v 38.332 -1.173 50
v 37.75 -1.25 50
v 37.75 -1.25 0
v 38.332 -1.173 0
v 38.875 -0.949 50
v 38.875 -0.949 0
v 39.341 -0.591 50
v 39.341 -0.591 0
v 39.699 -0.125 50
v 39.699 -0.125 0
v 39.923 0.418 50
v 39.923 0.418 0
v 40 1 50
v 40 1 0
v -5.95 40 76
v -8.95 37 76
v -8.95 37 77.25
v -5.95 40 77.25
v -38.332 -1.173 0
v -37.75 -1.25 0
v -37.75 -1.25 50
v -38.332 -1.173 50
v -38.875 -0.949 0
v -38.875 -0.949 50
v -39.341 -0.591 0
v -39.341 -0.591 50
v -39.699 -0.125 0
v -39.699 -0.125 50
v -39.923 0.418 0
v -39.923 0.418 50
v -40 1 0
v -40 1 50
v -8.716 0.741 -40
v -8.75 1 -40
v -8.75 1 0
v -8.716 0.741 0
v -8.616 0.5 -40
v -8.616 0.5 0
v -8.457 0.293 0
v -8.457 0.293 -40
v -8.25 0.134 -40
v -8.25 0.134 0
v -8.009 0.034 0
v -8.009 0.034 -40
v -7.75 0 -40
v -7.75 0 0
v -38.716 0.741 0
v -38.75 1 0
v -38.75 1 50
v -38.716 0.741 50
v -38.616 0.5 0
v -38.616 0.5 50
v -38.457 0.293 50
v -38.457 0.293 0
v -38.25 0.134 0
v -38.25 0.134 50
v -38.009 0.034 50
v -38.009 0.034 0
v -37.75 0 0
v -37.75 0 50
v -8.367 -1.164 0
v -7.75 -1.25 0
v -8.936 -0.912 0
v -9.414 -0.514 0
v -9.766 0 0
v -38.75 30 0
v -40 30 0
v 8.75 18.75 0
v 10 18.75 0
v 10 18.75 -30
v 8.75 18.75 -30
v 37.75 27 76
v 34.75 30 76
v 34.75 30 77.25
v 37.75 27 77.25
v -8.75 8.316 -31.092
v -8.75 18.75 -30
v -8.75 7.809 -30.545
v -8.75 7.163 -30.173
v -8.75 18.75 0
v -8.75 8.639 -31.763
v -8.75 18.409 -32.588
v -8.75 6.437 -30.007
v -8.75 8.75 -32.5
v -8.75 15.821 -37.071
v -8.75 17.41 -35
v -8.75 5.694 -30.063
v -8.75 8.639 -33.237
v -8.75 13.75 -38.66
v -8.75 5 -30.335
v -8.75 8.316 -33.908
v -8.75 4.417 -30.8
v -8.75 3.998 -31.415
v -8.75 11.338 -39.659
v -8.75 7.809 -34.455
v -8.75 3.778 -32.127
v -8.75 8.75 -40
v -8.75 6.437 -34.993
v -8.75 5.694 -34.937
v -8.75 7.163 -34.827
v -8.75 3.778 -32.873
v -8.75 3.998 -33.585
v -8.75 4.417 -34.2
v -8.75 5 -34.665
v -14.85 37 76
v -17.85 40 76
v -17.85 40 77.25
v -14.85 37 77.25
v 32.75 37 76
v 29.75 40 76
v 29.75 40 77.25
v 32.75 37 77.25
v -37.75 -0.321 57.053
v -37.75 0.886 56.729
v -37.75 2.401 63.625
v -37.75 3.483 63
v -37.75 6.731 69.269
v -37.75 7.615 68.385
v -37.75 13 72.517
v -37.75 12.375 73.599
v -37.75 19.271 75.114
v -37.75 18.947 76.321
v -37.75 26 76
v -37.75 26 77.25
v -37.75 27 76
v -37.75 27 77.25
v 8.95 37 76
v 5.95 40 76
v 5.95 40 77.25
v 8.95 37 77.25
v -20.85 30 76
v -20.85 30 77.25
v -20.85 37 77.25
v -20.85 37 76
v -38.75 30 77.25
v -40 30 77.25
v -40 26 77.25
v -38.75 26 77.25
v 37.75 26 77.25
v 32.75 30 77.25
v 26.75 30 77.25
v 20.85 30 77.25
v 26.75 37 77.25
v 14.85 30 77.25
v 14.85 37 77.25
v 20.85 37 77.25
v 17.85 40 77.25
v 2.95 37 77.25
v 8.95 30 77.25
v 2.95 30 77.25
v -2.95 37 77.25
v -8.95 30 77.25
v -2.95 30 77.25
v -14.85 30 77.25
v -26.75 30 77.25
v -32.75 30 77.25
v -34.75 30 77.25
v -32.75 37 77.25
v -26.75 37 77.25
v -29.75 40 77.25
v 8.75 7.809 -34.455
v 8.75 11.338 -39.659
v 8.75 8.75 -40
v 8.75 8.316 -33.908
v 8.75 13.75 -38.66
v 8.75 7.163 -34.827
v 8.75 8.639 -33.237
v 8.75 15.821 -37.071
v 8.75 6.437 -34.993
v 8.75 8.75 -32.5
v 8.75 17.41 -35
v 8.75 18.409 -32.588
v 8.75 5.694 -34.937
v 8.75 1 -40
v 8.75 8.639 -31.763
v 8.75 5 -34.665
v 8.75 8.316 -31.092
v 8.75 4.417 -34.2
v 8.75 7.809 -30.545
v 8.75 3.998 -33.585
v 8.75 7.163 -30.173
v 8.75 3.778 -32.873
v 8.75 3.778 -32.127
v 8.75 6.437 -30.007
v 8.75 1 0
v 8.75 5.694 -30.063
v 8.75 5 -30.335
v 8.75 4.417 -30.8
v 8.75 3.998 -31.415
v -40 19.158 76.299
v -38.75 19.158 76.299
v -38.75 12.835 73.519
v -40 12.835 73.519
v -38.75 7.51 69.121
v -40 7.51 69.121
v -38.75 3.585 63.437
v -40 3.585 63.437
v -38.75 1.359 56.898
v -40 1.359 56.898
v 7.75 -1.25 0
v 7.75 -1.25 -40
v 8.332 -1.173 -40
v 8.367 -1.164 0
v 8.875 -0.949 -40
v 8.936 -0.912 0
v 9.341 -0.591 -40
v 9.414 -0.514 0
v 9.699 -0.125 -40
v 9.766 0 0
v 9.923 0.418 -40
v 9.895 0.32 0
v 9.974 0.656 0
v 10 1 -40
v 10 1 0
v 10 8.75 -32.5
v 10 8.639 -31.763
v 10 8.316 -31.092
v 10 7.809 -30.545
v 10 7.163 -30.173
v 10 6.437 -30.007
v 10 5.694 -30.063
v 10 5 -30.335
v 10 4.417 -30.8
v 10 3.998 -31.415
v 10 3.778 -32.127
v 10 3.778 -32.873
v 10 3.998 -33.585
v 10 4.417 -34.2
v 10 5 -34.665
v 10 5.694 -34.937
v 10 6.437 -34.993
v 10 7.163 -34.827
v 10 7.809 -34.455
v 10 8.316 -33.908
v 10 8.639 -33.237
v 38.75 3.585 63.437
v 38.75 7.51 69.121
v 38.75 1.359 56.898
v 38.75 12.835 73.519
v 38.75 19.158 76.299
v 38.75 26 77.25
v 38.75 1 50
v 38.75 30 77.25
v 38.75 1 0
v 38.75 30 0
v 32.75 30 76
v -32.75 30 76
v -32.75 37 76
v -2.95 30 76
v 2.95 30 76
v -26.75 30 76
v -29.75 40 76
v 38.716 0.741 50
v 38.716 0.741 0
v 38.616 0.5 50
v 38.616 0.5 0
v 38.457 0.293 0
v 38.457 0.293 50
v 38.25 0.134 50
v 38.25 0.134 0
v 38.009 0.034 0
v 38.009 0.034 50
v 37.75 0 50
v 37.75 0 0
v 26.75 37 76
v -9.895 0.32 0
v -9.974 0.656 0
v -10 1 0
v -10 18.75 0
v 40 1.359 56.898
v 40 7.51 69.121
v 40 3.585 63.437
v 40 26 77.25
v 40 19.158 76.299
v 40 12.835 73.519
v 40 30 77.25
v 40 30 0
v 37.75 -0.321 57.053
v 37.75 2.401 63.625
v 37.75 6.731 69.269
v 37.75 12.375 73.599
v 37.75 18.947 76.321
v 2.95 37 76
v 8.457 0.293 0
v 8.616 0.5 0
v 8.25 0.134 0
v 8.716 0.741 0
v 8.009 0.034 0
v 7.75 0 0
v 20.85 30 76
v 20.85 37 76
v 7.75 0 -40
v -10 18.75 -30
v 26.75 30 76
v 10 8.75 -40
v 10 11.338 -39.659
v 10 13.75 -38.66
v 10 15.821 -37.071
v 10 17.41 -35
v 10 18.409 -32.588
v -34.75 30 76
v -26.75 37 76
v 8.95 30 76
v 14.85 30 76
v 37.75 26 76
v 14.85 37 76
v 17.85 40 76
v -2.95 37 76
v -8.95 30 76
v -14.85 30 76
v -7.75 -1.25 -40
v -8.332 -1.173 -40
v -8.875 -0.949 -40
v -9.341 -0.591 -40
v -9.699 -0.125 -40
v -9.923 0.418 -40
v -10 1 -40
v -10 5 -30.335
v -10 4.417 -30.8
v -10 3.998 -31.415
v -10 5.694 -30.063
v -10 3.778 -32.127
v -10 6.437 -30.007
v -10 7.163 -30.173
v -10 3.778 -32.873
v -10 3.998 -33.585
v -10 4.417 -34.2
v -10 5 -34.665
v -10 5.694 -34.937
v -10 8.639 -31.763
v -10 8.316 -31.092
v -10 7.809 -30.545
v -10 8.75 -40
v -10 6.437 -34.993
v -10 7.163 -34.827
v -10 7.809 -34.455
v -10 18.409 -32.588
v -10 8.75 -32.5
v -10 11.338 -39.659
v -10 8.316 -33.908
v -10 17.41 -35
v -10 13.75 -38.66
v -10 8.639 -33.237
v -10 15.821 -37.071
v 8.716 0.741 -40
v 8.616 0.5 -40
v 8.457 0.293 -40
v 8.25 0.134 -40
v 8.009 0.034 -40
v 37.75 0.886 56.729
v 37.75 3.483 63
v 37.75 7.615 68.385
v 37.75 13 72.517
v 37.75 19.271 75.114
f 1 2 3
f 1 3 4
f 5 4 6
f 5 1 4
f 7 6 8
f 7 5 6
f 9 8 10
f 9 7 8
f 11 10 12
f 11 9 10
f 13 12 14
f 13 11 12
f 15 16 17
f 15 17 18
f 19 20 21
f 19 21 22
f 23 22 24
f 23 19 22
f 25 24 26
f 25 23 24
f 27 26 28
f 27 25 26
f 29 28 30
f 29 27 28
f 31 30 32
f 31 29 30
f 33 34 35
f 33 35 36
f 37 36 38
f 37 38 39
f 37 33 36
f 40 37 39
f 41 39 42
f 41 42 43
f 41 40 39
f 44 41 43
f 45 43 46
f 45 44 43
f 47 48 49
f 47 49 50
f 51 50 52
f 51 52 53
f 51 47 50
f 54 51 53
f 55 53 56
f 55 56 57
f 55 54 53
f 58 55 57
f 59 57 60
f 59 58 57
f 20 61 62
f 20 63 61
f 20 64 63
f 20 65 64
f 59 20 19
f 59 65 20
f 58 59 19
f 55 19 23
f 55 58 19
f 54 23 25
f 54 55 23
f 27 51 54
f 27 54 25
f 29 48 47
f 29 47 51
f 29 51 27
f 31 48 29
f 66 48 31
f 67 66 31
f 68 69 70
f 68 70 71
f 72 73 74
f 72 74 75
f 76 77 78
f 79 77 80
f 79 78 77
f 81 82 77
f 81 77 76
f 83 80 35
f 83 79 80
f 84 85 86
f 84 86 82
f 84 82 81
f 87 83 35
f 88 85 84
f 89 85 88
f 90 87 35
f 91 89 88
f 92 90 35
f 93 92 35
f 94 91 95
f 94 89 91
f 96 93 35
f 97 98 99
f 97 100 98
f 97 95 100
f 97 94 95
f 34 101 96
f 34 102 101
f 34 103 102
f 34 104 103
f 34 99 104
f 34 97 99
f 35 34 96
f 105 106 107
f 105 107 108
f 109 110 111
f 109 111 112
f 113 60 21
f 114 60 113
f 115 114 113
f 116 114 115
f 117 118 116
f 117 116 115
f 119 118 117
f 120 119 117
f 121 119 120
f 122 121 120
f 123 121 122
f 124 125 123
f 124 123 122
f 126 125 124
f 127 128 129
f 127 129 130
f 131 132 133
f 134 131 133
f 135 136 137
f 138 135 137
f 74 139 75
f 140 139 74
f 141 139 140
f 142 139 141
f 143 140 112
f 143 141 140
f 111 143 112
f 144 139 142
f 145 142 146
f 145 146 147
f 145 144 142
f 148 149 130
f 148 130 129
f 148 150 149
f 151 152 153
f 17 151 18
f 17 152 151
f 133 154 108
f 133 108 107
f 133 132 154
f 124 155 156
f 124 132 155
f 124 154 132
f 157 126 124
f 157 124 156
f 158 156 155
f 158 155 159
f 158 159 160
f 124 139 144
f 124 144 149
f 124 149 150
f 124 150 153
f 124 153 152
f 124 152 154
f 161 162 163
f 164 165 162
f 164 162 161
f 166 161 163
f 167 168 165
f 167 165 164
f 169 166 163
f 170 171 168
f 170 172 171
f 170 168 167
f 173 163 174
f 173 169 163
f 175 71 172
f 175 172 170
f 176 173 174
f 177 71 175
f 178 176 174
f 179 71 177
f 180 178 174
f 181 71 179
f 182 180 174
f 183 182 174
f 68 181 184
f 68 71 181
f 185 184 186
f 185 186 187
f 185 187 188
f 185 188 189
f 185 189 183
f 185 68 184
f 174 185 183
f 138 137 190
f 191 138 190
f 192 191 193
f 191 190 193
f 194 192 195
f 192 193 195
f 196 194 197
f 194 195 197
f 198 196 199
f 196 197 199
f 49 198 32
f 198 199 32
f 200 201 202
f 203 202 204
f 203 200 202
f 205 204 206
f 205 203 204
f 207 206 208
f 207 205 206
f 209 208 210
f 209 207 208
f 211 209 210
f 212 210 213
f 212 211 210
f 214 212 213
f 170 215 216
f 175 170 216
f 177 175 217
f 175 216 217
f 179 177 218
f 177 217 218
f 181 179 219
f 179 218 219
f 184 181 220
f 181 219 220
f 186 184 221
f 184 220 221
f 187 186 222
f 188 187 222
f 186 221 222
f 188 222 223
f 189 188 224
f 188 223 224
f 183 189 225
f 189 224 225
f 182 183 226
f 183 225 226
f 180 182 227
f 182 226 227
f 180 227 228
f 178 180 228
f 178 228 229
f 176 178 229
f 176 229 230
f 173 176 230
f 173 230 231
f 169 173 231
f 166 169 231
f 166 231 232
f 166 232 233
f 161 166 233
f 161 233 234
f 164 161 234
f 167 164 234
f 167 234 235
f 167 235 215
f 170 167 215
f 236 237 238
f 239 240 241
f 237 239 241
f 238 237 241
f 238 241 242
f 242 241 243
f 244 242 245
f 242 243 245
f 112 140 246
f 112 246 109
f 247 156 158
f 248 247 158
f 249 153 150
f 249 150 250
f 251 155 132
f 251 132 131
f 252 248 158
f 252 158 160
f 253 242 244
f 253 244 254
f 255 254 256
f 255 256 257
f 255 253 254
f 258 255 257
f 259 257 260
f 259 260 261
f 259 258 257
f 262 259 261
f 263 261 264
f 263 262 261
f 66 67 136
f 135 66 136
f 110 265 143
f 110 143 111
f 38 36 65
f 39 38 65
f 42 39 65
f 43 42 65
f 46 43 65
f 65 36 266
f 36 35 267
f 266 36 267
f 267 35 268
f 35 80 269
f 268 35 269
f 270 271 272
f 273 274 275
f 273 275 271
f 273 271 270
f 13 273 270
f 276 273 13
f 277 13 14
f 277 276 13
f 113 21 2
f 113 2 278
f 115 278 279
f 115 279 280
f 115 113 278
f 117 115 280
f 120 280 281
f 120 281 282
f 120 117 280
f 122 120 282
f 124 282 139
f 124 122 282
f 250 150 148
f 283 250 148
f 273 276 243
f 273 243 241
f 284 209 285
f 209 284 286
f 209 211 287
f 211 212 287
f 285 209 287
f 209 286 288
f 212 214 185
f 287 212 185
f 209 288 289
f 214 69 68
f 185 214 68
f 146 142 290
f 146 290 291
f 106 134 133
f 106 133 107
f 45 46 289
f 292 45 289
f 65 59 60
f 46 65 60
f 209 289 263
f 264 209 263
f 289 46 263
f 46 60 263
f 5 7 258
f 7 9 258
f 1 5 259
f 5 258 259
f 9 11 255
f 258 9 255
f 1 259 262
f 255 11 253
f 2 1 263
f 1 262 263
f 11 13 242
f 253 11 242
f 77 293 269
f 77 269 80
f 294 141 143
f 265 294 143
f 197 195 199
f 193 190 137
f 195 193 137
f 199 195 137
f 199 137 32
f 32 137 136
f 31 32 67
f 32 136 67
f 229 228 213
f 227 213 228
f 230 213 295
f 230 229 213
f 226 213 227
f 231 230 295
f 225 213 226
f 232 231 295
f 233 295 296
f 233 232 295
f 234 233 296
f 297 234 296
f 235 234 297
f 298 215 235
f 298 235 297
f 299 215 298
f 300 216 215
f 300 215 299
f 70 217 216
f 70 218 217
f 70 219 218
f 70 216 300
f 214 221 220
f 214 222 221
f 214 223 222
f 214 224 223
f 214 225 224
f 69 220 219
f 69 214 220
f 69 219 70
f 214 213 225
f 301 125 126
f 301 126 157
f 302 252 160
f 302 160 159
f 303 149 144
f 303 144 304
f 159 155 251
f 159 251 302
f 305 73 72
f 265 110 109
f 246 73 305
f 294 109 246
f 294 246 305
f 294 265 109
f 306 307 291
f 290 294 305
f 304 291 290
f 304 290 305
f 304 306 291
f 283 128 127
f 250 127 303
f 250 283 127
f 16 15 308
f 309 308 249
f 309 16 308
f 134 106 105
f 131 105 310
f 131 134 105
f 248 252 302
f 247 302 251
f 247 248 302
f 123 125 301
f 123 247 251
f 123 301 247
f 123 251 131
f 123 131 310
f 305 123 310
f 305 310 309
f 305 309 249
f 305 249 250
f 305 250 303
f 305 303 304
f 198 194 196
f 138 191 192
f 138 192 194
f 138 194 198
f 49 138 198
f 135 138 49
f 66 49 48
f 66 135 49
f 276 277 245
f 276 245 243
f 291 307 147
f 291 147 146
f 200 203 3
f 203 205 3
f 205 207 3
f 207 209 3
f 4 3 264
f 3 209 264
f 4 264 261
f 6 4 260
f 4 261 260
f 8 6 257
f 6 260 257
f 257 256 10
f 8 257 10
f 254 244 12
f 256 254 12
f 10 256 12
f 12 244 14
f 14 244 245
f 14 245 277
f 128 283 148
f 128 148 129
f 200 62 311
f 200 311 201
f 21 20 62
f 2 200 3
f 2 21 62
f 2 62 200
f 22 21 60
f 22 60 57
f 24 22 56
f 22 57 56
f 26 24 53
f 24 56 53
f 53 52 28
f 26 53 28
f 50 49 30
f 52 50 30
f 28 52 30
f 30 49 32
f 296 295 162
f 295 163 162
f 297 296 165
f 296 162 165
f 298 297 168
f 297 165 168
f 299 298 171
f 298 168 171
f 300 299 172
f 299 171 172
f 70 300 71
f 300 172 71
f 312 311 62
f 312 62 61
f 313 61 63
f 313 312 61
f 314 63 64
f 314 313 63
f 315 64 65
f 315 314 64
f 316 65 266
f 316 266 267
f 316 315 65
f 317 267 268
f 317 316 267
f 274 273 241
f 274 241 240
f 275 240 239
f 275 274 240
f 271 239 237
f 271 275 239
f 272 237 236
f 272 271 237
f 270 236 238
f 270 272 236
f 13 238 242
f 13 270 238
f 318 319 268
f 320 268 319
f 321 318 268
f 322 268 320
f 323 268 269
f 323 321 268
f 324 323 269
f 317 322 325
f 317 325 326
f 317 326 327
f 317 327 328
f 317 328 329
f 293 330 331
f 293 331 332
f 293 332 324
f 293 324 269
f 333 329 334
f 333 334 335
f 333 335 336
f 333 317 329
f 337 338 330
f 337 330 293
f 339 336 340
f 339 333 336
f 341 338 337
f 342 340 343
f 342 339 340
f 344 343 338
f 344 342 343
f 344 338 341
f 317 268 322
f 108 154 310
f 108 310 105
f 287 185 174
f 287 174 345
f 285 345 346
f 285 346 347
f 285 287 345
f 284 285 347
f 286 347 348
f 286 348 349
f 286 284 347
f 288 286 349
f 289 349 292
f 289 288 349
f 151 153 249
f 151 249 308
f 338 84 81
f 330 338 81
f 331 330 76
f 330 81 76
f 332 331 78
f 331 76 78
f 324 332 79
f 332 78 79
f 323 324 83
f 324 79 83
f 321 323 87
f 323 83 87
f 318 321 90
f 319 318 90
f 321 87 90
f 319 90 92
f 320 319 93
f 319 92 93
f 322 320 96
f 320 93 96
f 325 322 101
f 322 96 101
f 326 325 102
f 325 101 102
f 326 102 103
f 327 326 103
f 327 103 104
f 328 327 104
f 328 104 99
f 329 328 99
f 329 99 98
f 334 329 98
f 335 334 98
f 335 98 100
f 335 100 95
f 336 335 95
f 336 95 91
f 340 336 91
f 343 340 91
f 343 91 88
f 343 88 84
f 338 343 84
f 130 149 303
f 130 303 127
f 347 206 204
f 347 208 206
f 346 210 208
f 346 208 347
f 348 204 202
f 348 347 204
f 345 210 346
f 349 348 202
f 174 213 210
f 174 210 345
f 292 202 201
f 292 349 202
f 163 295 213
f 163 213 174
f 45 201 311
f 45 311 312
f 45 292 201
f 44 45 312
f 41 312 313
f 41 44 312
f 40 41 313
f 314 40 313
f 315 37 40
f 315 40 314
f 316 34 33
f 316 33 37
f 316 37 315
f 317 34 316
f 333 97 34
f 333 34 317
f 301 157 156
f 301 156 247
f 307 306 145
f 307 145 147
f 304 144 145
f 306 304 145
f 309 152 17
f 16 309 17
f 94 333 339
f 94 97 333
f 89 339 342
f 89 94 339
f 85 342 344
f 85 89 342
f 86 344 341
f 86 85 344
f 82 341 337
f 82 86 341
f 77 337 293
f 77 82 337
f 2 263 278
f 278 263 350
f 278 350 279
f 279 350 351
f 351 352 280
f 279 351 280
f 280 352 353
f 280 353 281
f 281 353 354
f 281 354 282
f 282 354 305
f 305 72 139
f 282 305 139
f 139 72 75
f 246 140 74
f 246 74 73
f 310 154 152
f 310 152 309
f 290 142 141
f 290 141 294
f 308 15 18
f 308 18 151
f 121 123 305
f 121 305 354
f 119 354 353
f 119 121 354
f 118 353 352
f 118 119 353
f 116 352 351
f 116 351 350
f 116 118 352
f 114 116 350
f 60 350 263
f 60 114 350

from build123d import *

# Parameters (mm, degrees)
SKETCH1_W                      = 20
SKETCH1_H                      = 40
BASE_FLANGE1_DEPTH             = 1.25
EDGE_FLANGE1_STRIP_W           = 7
EDGE_FLANGE1_STRIP_H           = 1.25
EDGE_FLANGE1_STRIP_CUT_DEPTH   = 40
EDGE_FLANGE1_STRIP_2_W         = 7
EDGE_FLANGE1_STRIP_2_H         = 1.25
EDGE_FLANGE1_STRIP_CUT_2_DEPTH = 40
EDGE_FLANGE1_DEPTH             = 40
EDGE_FLANGE1_BEND_DEPTH        = 40
SKETCH12_W                     = 80
SKETCH12_H                     = 50
TAB1_DEPTH                     = 1.25
EDGE_FLANGE2_STRIP_W           = 7
EDGE_FLANGE2_STRIP_H           = 1.25
EDGE_FLANGE2_STRIP_CUT_DEPTH   = 50
EDGE_FLANGE2_STRIP_2_W         = 7
EDGE_FLANGE2_STRIP_2_H         = 1.25
EDGE_FLANGE2_STRIP_CUT_2_DEPTH = 50
EDGE_FLANGE2_DEPTH             = 50
EDGE_FLANGE2_BEND_DEPTH        = 50
EDGE_FLANGE3_DEPTH             = 75.5
TAB2_DEPTH                     = 1.25
SKETCH27_W                     = 6
SKETCH27_H                     = 10
TAB3_DEPTH                     = 1.25
BREAK_CORNER1_START            = 76
BREAK_CORNER1_DEPTH            = 1.25
CUT_EXTRUDE1_REACH             = 102.337
SKETCH30_R                     = 2.5
FILLET1_R                      = 10


# Read off the part's stored shape, not the designer's step: Break-Corner1
# Sheet-metal steps are written as plain solids
with BuildPart() as part:
    # Sketch1 → Base-Flange1 (new body)
    with BuildSketch(Plane(origin=(0, 0, 0), x_dir=(1, 0, 0), z_dir=(0, 1, 0))):
        with Locations((0, 20)):
            Rectangle(SKETCH1_W, SKETCH1_H)
    extrude(amount=-BASE_FLANGE1_DEPTH)

    # Edge-Flange1 strip (across the edge) → Edge-Flange1 strip cut (cut)
    with BuildSketch(Plane(origin=(10, 0, 0), x_dir=(-1, 0, 0), z_dir=(0, 0, -1))):
        with Locations((-1.25, -0.625)):
            Rectangle(EDGE_FLANGE1_STRIP_W, EDGE_FLANGE1_STRIP_H)
    extrude(amount=EDGE_FLANGE1_STRIP_CUT_DEPTH, mode=Mode.SUBTRACT)

    # Edge-Flange1 strip 2 (across the edge) → Edge-Flange1 strip cut 2 (cut)
    with BuildSketch(Plane(origin=(-10, 0, -40), x_dir=(1, 0, 0), z_dir=(0, 0, 1))):
        with Locations((-1.25, -0.625)):
            Rectangle(EDGE_FLANGE1_STRIP_2_W, EDGE_FLANGE1_STRIP_2_H)
    extrude(amount=EDGE_FLANGE1_STRIP_CUT_2_DEPTH, mode=Mode.SUBTRACT)

    # Edge-Flange1 section (across the edge) → Edge-Flange1 (add)
    with BuildSketch(Plane(origin=(10, 0, 0), x_dir=(-1, 0, 0), z_dir=(0, 0, -1))):
        with BuildLine():
            Line((0, 1), (0, 18.75))
            Line((0, 18.75), (1.25, 18.75))
            Line((1.25, 18.75), (1.25, 1))
            ThreePointArc((1.25, 1), (1.542893219, 0.292893219), (2.25, 0))
            Line((2.25, 0), (2.25, -1.25))
            ThreePointArc((2.25, -1.25), (0.659009742, -0.590990258), (0, 1))
        make_face()
    extrude(amount=EDGE_FLANGE1_DEPTH)

    # Edge-Flange1 section 2 (across the edge) → Edge-Flange1 bend (add)
    with BuildSketch(Plane(origin=(-10, 0, -40), x_dir=(1, 0, 0), z_dir=(0, 0, 1))):
        with BuildLine():
            Line((0, 1), (0, 18.75))
            Line((0, 18.75), (1.25, 18.75))
            Line((1.25, 18.75), (1.25, 1))
            ThreePointArc((1.25, 1), (1.542893219, 0.292893219), (2.25, 0))
            Line((2.25, 0), (2.25, -1.25))
            ThreePointArc((2.25, -1.25), (0.659009742, -0.590990258), (0, 1))
        make_face()
    extrude(amount=EDGE_FLANGE1_BEND_DEPTH)

    # Sketch12 → Tab1 (add)
    with BuildSketch(Plane.XZ.offset(1.25)):
        with Locations((0, 25)):
            Rectangle(SKETCH12_W, SKETCH12_H)
    extrude(amount=-TAB1_DEPTH)

    # Edge-Flange2 strip (across the edge) → Edge-Flange2 strip cut (cut)
    with BuildSketch(Plane(origin=(40, 0, 50), x_dir=(-1, 0, 0), z_dir=(0, 0, -1))):
        with Locations((-1.25, -0.625)):
            Rectangle(EDGE_FLANGE2_STRIP_W, EDGE_FLANGE2_STRIP_H)
    extrude(amount=EDGE_FLANGE2_STRIP_CUT_DEPTH, mode=Mode.SUBTRACT)

    # Edge-Flange2 strip 2 (across the edge) → Edge-Flange2 strip cut 2 (cut)
    with BuildSketch(Plane(origin=(-40, 0, 0), x_dir=(1, 0, 0), z_dir=(0, 0, 1))):
        with Locations((-1.25, -0.625)):
            Rectangle(EDGE_FLANGE2_STRIP_2_W, EDGE_FLANGE2_STRIP_2_H)
    extrude(amount=EDGE_FLANGE2_STRIP_CUT_2_DEPTH, mode=Mode.SUBTRACT)

    # Edge-Flange2 section (across the edge) → Edge-Flange2 (add)
    with BuildSketch(Plane(origin=(40, 0, 50), x_dir=(-1, 0, 0), z_dir=(0, 0, -1))):
        with BuildLine():
            Line((0, 1), (0, 30))
            Line((0, 30), (1.25, 30))
            Line((1.25, 30), (1.25, 1))
            ThreePointArc((1.25, 1), (1.542893219, 0.292893219), (2.25, 0))
            Line((2.25, 0), (2.25, -1.25))
            ThreePointArc((2.25, -1.25), (0.659009742, -0.590990258), (0, 1))
        make_face()
    extrude(amount=EDGE_FLANGE2_DEPTH)

    # Edge-Flange2 section 2 (across the edge) → Edge-Flange2 bend (add)
    with BuildSketch(Plane(origin=(-40, 0, 0), x_dir=(1, 0, 0), z_dir=(0, 0, 1))):
        with BuildLine():
            Line((0, 1), (0, 30))
            Line((0, 30), (1.25, 30))
            Line((1.25, 30), (1.25, 1))
            ThreePointArc((1.25, 1), (1.542893219, 0.292893219), (2.25, 0))
            Line((2.25, 0), (2.25, -1.25))
            ThreePointArc((2.25, -1.25), (0.659009742, -0.590990258), (0, 1))
        make_face()
    extrude(amount=EDGE_FLANGE2_BEND_DEPTH)

    # Edge-Flange3 section (across the edge) → Edge-Flange3 (add)
    with BuildSketch(Plane(origin=(-37.75, 0, 76), x_dir=(0, 0, -1), z_dir=(1, 0, 0))):
        with BuildLine():
            Line((-1.25, 26), (-1.25, 30))
            Line((-1.25, 30), (0, 30))
            Line((0, 30), (0, 26))
            ThreePointArc((0, 26), (7.615223689, 7.615223689), (26, 0))
            Line((26, 0), (26, -1.25))
            ThreePointArc((26, -1.25), (6.731340213, 6.731340213), (-1.25, 26))
        make_face()
    extrude(amount=EDGE_FLANGE3_DEPTH)

    # Sketch24 → Tab2 (add)
    with BuildSketch(Plane(origin=(40, 0, 0), x_dir=(0, 0, -1), z_dir=(1, 0, 0))):
        with BuildLine():
            Line((-50, 30), (-77.25, 30))
            Line((-77.25, 30), (-77.25, 26))
            ThreePointArc((-77.25, 26), (-69.120673955, 7.509715389), (-50, 1))
            Line((-50, 1), (-50, 30))
        make_face()
    tab2 = extrude(amount=-TAB2_DEPTH)

    # Mirror1: Tab2 across plane
    add(tab2.mirror(Plane(origin=(0, 0, 0), x_dir=(0, 0, 1), z_dir=(1, 0, 0))))

    # Sketch27 → Tab3 (add)
    with BuildSketch(Plane.XY.offset(77.25)):
        with Locations((-29.75, 35)):
            Rectangle(SKETCH27_W, SKETCH27_H)
        with Locations((-17.85, 35)):
            Rectangle(SKETCH27_W, SKETCH27_H)
        with Locations((-5.95, 35)):
            Rectangle(SKETCH27_W, SKETCH27_H)
        with Locations((5.95, 35)):
            Rectangle(SKETCH27_W, SKETCH27_H)
        with Locations((17.85, 35)):
            Rectangle(SKETCH27_W, SKETCH27_H)
        with Locations((29.75, 35)):
            Rectangle(SKETCH27_W, SKETCH27_H)
    extrude(amount=-TAB3_DEPTH)

    # Break-Corner1 outline → Break-Corner1 (cut)
    with BuildSketch(Plane.XY.offset(BREAK_CORNER1_START)):
        Polygon((-37.75, 30), (-37.75, 27), (-34.75, 30), align=None)
        Polygon((-26.75, 40), (-29.75, 40), (-26.75, 37), align=None)
        Polygon((-32.75, 40), (-32.75, 37), (-29.75, 40), align=None)
        Polygon((-20.85, 40), (-20.85, 37), (-17.85, 40), align=None)
        Polygon((-14.85, 40), (-17.85, 40), (-14.85, 37), align=None)
        Polygon((-8.95, 40), (-8.95, 37), (-5.95, 40), align=None)
        Polygon((-2.95, 40), (-5.95, 40), (-2.95, 37), align=None)
        Polygon((2.95, 40), (2.95, 37), (5.95, 40), align=None)
        Polygon((8.95, 40), (5.95, 40), (8.95, 37), align=None)
        Polygon((14.85, 40), (14.85, 37), (17.85, 40), align=None)
        Polygon((20.85, 40), (17.85, 40), (20.85, 37), align=None)
        Polygon((26.75, 40), (26.75, 37), (29.75, 40), align=None)
        Polygon((37.75, 30), (34.75, 30), (37.75, 27), align=None)
        Polygon((32.75, 40), (29.75, 40), (32.75, 37), align=None)
    extrude(amount=BREAK_CORNER1_DEPTH, mode=Mode.SUBTRACT)

    # Cut-Extrude1: up to this face of the body (flat: up to its plane)
    cut_extrude1_end = Plane(part.part.faces().sort_by_distance((-10, 9.875, -20))[0])
    # Sketch30 → Cut-Extrude1 (cut, up to the picked face)
    with BuildSketch(Plane(origin=(10, 0, 0), x_dir=(0, 0, -1), z_dir=(1, 0, 0)), mode=Mode.PRIVATE) as cut_extrude1_sk1:
        with Locations(Location((32.5, 6.25, 0), (0, 0, 90))):
            Circle(SKETCH30_R)
    cut_extrude1_tool1 = split(extrude(cut_extrude1_sk1.sketch, amount=-CUT_EXTRUDE1_REACH, mode=Mode.PRIVATE), bisect_by=cut_extrude1_end, keep=Keep.BOTH, mode=Mode.PRIVATE)
    add(cut_extrude1_tool1.solids().sort_by(Axis((10, 6.25, -32.5), (-1, 0, 0)))[0], mode=Mode.SUBTRACT)

    # Fillet1
    fillet1_edges = [part.edges().sort_by_distance(p)[0] for p in [
        (9.375, 18.75, -40),
        (-9.375, 18.75, -40),
    ]]
    fillet(fillet1_edges, radius=FILLET1_R)


solid = part.part
